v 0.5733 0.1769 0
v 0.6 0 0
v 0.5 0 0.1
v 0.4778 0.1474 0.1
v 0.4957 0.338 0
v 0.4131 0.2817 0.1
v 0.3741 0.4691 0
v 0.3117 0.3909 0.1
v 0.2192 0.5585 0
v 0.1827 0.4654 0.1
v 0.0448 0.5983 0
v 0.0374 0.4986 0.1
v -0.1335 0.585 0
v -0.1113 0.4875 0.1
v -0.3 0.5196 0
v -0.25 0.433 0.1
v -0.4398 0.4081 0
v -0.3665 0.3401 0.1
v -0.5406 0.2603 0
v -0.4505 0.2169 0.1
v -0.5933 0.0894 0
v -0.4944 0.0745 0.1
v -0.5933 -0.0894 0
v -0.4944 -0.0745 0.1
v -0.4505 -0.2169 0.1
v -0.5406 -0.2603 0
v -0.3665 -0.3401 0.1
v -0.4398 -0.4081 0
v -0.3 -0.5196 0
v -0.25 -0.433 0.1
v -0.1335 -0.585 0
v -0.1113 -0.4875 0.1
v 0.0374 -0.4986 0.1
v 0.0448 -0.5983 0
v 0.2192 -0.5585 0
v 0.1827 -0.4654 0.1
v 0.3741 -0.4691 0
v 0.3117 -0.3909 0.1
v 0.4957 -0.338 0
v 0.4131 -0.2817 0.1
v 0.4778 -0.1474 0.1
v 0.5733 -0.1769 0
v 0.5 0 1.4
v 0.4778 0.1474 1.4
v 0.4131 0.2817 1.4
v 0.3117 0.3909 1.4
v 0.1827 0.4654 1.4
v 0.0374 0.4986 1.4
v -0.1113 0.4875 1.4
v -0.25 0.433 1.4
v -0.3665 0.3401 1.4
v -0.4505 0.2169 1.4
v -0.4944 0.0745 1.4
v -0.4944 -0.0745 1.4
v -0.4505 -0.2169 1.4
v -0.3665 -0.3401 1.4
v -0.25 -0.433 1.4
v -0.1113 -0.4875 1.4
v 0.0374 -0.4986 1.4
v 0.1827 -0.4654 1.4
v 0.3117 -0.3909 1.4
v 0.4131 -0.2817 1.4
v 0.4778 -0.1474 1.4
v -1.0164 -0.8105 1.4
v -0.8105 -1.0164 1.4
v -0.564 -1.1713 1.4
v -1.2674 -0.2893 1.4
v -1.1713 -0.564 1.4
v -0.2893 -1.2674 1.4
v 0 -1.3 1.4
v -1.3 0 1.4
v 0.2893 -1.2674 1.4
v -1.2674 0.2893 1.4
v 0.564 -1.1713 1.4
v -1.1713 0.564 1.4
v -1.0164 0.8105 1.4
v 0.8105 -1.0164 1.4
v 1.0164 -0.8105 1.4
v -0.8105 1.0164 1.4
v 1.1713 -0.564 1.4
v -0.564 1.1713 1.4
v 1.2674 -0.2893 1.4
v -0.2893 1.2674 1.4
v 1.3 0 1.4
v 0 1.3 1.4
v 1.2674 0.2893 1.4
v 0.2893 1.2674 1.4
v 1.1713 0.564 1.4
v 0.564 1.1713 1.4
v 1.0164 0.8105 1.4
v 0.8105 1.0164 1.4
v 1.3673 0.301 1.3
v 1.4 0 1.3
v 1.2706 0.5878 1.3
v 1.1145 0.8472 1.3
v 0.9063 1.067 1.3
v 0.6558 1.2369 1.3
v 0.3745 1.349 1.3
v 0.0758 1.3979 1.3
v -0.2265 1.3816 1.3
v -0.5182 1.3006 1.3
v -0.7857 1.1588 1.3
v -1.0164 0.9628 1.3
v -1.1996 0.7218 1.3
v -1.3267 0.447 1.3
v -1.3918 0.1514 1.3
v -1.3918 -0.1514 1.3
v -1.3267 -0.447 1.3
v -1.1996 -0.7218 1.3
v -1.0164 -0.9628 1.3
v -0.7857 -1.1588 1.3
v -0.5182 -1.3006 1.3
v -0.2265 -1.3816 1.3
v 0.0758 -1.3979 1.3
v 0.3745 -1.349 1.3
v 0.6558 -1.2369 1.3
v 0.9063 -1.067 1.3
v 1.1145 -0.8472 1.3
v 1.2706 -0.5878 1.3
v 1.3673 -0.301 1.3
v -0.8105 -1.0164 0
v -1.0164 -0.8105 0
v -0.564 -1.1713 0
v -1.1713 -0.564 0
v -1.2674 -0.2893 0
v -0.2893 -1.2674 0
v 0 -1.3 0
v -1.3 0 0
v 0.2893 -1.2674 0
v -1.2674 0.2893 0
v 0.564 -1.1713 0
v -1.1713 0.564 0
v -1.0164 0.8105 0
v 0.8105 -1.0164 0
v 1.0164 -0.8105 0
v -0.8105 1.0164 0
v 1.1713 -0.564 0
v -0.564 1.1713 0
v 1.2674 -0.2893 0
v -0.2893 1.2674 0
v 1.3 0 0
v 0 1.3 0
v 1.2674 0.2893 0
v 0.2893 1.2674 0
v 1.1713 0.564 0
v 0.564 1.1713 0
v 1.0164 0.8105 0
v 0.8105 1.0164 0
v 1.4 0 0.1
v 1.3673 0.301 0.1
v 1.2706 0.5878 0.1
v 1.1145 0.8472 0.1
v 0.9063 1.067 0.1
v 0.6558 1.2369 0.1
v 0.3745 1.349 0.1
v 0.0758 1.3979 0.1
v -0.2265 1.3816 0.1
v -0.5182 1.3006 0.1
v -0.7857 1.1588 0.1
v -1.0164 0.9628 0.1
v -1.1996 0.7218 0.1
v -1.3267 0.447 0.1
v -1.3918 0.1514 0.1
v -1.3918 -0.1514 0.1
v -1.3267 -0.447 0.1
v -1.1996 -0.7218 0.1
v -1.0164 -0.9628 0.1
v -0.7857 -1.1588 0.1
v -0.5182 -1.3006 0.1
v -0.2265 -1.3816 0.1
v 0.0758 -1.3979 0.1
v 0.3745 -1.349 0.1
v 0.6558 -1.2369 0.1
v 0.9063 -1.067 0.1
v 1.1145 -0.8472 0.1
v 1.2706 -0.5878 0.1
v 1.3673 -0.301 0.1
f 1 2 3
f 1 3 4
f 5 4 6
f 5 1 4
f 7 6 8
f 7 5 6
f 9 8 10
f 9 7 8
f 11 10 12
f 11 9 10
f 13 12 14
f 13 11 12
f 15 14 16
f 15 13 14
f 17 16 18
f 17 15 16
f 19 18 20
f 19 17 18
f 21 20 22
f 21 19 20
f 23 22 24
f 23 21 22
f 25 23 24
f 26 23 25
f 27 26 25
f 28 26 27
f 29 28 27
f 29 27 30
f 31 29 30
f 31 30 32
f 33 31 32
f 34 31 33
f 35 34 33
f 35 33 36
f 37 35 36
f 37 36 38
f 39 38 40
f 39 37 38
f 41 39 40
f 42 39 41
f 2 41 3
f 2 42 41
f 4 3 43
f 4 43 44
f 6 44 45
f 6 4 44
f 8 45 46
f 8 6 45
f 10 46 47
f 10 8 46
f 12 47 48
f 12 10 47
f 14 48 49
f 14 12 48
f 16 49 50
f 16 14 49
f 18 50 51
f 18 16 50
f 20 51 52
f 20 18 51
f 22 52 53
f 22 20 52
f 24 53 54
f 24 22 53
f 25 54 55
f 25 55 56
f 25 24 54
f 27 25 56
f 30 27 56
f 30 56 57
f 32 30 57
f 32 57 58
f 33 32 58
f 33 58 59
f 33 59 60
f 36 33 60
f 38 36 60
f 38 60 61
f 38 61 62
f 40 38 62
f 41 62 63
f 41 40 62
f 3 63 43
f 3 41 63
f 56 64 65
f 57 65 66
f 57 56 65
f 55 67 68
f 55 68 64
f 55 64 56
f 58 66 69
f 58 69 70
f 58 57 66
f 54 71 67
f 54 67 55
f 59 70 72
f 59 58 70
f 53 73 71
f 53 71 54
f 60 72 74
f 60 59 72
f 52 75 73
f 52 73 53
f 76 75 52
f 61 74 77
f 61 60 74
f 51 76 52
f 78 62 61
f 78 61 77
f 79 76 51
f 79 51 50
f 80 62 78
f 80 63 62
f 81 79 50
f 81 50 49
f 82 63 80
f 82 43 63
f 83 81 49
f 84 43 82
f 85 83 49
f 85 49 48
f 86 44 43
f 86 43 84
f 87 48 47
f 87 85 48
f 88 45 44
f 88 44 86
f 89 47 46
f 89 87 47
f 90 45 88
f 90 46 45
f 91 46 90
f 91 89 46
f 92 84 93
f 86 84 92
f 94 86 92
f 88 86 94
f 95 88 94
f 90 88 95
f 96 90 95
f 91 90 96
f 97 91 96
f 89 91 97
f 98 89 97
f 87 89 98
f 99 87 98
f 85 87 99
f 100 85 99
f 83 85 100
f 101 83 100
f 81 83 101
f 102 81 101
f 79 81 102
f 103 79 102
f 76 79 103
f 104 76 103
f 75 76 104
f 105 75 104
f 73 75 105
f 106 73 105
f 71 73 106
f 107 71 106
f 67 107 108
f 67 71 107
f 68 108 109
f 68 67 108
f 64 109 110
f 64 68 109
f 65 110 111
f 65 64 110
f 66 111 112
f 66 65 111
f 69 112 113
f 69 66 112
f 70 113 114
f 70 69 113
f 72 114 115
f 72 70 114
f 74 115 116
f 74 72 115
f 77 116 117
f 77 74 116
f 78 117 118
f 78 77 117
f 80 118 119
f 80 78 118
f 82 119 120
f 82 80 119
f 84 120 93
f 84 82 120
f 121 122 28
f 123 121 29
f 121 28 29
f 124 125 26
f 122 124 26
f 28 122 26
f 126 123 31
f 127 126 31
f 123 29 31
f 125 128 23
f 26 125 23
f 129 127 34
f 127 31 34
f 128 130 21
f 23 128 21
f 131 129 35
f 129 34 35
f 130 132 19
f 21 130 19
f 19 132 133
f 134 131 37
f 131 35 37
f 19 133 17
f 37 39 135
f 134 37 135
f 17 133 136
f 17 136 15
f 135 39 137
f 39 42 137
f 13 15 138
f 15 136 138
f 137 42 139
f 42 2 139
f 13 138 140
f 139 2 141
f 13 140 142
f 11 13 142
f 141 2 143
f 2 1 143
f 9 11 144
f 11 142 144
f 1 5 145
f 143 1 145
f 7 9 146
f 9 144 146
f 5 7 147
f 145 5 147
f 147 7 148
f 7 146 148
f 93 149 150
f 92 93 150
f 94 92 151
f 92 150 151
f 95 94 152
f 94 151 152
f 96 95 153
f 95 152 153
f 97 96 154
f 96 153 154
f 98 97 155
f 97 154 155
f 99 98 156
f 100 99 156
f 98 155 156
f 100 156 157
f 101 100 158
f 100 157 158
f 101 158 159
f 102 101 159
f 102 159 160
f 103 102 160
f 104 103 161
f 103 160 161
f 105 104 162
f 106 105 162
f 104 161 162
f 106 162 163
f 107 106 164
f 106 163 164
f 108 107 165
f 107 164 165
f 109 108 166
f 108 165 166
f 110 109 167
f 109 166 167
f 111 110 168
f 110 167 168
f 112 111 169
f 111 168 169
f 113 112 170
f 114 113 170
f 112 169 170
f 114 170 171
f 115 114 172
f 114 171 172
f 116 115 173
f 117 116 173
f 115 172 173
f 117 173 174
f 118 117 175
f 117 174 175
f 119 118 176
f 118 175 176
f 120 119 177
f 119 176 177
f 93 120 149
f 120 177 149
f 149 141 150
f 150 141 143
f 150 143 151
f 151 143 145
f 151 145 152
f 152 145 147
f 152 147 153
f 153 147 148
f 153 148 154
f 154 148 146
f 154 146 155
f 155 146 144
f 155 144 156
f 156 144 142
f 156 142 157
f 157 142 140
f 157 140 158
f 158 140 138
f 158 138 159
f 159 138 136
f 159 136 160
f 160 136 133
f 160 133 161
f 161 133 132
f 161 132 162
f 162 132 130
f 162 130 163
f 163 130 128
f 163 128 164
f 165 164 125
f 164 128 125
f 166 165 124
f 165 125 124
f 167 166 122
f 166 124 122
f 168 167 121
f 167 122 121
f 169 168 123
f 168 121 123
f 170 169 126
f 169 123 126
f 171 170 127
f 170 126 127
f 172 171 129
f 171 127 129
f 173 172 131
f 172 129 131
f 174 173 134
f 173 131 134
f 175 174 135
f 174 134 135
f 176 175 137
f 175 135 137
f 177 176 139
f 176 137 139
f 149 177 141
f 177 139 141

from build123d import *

# Parameters (mm, degrees)
SKETCH1_R           = 1.4
SKETCH1_R_2         = 0.5
BOSS_EXTRUDE1_DEPTH = 1.4
CHAMFER1_SIZE       = 0.1


with BuildPart() as part:
    # Sketch1 → Boss-Extrude1 (new body)
    with BuildSketch(Plane.XY):
        Circle(SKETCH1_R)
        Circle(SKETCH1_R_2, mode=Mode.SUBTRACT)
    extrude(amount=BOSS_EXTRUDE1_DEPTH)

    # Chamfer1
    chamfer1_edges = [part.edges().sort_by_distance(p)[0] for p in [
        (-1.4, 0, 0),
        (-1.4, 0, 1.4),
        (-0.5, 0, 0),
    ]]
    chamfer(chamfer1_edges, length=CHAMFER1_SIZE)


solid = part.part
